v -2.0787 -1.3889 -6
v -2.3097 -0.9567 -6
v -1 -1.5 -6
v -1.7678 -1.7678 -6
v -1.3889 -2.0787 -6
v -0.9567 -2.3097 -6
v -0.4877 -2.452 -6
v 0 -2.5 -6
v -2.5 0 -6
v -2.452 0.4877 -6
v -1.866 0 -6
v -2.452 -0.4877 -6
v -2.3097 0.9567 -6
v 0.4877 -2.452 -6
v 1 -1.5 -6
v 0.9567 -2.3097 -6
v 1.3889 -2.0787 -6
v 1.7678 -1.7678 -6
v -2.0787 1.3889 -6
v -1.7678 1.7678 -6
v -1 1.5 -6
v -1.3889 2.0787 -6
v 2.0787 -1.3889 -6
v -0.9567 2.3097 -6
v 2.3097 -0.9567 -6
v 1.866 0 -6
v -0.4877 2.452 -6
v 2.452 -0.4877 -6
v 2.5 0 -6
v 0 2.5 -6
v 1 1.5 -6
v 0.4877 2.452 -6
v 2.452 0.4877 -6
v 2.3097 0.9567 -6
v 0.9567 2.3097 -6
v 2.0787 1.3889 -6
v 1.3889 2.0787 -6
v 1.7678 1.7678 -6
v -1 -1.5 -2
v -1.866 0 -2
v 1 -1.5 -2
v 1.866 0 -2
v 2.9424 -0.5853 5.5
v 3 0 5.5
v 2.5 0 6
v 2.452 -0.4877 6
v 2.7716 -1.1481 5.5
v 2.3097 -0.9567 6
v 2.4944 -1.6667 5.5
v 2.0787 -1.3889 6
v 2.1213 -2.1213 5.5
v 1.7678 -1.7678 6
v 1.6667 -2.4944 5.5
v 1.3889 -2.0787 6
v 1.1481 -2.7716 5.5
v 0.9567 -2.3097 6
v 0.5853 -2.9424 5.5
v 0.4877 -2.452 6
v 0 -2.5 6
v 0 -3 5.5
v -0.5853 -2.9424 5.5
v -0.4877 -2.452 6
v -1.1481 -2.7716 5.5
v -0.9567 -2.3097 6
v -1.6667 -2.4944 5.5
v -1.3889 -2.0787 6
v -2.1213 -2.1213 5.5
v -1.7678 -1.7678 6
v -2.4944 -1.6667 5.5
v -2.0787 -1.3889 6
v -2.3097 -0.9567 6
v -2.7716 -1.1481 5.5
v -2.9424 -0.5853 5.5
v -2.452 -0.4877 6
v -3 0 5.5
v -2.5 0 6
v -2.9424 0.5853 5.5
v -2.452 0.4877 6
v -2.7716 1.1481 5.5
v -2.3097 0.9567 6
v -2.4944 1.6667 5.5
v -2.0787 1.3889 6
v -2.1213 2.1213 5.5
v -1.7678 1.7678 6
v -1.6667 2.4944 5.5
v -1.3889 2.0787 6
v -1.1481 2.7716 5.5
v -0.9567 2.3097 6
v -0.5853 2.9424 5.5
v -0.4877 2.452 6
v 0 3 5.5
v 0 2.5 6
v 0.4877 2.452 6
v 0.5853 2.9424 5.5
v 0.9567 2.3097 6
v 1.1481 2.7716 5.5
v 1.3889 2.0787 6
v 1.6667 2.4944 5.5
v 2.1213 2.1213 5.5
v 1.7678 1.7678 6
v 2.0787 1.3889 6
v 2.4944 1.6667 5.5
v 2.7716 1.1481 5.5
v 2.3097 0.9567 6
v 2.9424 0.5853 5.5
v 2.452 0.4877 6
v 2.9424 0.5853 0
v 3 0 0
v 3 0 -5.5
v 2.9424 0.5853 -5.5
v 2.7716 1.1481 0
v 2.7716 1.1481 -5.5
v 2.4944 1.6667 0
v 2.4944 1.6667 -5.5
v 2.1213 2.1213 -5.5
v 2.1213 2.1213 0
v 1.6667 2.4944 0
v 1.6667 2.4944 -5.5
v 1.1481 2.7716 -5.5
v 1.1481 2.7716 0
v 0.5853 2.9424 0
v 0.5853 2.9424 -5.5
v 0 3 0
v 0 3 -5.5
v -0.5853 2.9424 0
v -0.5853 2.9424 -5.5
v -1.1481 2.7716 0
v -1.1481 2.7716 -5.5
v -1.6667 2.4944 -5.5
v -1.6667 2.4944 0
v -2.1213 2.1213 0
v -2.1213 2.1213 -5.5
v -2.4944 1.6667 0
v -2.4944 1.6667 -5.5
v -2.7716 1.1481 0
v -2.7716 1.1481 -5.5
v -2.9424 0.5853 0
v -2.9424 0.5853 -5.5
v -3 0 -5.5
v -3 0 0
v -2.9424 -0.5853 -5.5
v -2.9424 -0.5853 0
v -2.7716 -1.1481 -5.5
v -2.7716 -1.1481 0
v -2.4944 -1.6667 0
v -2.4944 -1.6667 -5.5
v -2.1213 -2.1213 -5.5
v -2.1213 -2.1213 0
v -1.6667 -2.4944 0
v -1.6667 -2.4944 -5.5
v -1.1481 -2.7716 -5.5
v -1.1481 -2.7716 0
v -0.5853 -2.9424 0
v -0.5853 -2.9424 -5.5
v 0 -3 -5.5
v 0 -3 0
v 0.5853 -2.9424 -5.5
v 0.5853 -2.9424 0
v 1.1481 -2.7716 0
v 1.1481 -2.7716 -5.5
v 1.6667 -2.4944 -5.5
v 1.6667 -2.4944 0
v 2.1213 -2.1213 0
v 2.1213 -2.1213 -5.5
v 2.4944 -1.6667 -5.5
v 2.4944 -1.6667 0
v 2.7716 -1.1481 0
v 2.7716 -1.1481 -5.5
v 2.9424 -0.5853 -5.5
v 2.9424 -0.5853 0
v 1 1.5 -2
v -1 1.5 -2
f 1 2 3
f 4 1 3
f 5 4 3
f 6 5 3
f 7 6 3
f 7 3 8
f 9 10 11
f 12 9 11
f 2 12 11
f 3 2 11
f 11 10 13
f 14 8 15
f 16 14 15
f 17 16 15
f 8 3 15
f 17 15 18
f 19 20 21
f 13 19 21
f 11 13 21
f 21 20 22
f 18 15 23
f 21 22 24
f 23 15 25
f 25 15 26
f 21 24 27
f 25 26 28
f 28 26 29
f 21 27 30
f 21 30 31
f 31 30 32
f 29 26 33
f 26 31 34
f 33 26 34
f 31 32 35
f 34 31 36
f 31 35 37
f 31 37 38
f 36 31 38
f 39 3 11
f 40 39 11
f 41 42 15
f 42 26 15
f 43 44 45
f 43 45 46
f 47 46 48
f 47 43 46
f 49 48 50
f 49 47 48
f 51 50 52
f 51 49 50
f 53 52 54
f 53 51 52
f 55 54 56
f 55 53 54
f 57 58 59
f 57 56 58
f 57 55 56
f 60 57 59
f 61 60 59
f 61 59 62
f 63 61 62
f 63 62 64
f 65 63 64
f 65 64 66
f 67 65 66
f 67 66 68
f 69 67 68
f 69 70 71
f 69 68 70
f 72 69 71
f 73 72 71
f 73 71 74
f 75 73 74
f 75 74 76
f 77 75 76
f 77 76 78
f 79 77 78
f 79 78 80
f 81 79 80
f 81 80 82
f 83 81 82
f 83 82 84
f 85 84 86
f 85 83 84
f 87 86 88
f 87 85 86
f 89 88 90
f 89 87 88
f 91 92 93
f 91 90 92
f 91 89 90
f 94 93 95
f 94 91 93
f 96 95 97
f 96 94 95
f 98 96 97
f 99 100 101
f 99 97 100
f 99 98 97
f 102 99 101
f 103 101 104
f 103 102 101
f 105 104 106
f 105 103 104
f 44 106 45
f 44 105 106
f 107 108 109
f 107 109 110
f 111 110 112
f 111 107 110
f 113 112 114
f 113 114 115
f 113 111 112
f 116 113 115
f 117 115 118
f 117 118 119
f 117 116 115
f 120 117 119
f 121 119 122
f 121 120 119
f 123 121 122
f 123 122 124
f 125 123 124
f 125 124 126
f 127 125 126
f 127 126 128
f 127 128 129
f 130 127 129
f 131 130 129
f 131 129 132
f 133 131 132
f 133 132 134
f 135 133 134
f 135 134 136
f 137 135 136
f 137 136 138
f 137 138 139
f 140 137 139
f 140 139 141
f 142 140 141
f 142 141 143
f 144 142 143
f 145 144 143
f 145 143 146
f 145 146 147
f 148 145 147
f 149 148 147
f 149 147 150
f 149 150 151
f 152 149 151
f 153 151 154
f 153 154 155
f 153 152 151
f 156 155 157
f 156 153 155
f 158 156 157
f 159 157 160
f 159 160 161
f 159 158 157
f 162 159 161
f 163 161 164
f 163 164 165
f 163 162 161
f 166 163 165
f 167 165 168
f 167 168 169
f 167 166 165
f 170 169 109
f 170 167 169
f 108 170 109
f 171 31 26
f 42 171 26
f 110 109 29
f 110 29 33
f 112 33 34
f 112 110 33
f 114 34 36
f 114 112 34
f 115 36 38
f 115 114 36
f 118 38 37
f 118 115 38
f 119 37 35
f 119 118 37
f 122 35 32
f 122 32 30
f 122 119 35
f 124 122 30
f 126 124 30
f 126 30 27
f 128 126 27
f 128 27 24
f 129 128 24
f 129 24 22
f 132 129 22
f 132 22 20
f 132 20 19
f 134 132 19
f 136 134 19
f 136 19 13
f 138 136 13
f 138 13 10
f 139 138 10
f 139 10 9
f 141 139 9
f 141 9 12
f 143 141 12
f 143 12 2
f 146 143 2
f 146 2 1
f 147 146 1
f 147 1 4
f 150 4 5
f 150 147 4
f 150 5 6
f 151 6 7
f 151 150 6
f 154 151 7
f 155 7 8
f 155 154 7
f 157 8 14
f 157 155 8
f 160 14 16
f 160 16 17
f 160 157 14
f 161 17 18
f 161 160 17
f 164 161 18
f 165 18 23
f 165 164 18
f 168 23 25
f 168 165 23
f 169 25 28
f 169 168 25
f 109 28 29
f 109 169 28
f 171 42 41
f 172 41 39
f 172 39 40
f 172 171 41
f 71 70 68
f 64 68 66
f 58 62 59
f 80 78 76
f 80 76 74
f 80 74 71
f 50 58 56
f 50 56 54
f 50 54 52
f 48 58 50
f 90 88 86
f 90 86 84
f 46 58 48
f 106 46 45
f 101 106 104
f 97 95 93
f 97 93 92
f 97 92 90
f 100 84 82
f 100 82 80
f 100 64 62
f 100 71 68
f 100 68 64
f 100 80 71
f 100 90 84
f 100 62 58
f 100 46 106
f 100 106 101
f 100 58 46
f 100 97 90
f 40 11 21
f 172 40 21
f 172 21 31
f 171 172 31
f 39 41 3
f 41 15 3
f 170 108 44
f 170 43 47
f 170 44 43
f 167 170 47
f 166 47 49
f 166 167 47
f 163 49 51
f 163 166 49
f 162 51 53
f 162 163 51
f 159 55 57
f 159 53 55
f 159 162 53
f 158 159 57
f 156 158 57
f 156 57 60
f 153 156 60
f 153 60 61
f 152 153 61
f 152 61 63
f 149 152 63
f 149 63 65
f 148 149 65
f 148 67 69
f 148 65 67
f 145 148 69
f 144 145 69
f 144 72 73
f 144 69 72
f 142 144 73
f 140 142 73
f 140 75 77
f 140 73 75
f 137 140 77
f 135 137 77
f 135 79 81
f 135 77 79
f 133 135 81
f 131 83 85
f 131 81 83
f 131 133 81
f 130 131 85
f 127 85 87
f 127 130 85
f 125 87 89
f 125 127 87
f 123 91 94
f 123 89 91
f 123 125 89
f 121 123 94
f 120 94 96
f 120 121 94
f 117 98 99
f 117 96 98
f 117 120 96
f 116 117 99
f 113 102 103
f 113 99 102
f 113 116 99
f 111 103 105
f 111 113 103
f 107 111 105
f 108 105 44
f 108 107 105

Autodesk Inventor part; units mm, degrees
ref_plane "YZ Plane" through (0, 0, 0) normal (1, 0, 0) x (0, 1, 0)
ref_plane "XZ Plane" through (0, 0, 0) normal (0, 1, 0) x (-1, 0, 0)
ref_plane "XY Plane" through (0, 0, 0) normal (0, 0, 1) x (1, 0, 0)
sketch "Sketch1" plane through (0, 0, 0) normal (0, 0, 1) x (1, 0, 0)
  circle A0 centre (0, 0) radius 3
  dimension "d0" = 6
extrude "Extrusion1" add sketch "Sketch1" along normal mid plane 12
chamfer "Chamfer1" distance 0.5 angle 45 2 edges at (-3, 0, 6) (-3, 0, -6)
sketch "Sketch2" plane through (0, 0, -6) normal (0, 0, -1) x (-1, 0, 0)
  circle A0 centre (0, 0) radius 2.5 projected
  line L0 (-1.866, 0) -> (-1, -1.5)
  line L1 (-1, 1.5) -> (-1.866, 0)
  line L2 (1, 1.5) -> (-1, 1.5)
  line L3 (1.866, 0) -> (1, 1.5)
  line L4 (1, -1.5) -> (1.866, 0)
  line L5 (-1, -1.5) -> (1, -1.5)
  circle A1 centre (0, 0) radius 1.616 construction
  dimension "d5" = 3.2321
  dimension "d10" = 1.5
  dimension "d11" = 120
  dimension "d13" = 120
  dimension "d16" = 3
extrude "Extrusion2" cut sketch "Sketch2" against normal blind 4 contours L1 L2 L3 L4 L5 L0
thread "Thread1" size "M6x1" class "6g" standard "ANSI Metric M Profile" full length
properties part number "6mm SHCS"
